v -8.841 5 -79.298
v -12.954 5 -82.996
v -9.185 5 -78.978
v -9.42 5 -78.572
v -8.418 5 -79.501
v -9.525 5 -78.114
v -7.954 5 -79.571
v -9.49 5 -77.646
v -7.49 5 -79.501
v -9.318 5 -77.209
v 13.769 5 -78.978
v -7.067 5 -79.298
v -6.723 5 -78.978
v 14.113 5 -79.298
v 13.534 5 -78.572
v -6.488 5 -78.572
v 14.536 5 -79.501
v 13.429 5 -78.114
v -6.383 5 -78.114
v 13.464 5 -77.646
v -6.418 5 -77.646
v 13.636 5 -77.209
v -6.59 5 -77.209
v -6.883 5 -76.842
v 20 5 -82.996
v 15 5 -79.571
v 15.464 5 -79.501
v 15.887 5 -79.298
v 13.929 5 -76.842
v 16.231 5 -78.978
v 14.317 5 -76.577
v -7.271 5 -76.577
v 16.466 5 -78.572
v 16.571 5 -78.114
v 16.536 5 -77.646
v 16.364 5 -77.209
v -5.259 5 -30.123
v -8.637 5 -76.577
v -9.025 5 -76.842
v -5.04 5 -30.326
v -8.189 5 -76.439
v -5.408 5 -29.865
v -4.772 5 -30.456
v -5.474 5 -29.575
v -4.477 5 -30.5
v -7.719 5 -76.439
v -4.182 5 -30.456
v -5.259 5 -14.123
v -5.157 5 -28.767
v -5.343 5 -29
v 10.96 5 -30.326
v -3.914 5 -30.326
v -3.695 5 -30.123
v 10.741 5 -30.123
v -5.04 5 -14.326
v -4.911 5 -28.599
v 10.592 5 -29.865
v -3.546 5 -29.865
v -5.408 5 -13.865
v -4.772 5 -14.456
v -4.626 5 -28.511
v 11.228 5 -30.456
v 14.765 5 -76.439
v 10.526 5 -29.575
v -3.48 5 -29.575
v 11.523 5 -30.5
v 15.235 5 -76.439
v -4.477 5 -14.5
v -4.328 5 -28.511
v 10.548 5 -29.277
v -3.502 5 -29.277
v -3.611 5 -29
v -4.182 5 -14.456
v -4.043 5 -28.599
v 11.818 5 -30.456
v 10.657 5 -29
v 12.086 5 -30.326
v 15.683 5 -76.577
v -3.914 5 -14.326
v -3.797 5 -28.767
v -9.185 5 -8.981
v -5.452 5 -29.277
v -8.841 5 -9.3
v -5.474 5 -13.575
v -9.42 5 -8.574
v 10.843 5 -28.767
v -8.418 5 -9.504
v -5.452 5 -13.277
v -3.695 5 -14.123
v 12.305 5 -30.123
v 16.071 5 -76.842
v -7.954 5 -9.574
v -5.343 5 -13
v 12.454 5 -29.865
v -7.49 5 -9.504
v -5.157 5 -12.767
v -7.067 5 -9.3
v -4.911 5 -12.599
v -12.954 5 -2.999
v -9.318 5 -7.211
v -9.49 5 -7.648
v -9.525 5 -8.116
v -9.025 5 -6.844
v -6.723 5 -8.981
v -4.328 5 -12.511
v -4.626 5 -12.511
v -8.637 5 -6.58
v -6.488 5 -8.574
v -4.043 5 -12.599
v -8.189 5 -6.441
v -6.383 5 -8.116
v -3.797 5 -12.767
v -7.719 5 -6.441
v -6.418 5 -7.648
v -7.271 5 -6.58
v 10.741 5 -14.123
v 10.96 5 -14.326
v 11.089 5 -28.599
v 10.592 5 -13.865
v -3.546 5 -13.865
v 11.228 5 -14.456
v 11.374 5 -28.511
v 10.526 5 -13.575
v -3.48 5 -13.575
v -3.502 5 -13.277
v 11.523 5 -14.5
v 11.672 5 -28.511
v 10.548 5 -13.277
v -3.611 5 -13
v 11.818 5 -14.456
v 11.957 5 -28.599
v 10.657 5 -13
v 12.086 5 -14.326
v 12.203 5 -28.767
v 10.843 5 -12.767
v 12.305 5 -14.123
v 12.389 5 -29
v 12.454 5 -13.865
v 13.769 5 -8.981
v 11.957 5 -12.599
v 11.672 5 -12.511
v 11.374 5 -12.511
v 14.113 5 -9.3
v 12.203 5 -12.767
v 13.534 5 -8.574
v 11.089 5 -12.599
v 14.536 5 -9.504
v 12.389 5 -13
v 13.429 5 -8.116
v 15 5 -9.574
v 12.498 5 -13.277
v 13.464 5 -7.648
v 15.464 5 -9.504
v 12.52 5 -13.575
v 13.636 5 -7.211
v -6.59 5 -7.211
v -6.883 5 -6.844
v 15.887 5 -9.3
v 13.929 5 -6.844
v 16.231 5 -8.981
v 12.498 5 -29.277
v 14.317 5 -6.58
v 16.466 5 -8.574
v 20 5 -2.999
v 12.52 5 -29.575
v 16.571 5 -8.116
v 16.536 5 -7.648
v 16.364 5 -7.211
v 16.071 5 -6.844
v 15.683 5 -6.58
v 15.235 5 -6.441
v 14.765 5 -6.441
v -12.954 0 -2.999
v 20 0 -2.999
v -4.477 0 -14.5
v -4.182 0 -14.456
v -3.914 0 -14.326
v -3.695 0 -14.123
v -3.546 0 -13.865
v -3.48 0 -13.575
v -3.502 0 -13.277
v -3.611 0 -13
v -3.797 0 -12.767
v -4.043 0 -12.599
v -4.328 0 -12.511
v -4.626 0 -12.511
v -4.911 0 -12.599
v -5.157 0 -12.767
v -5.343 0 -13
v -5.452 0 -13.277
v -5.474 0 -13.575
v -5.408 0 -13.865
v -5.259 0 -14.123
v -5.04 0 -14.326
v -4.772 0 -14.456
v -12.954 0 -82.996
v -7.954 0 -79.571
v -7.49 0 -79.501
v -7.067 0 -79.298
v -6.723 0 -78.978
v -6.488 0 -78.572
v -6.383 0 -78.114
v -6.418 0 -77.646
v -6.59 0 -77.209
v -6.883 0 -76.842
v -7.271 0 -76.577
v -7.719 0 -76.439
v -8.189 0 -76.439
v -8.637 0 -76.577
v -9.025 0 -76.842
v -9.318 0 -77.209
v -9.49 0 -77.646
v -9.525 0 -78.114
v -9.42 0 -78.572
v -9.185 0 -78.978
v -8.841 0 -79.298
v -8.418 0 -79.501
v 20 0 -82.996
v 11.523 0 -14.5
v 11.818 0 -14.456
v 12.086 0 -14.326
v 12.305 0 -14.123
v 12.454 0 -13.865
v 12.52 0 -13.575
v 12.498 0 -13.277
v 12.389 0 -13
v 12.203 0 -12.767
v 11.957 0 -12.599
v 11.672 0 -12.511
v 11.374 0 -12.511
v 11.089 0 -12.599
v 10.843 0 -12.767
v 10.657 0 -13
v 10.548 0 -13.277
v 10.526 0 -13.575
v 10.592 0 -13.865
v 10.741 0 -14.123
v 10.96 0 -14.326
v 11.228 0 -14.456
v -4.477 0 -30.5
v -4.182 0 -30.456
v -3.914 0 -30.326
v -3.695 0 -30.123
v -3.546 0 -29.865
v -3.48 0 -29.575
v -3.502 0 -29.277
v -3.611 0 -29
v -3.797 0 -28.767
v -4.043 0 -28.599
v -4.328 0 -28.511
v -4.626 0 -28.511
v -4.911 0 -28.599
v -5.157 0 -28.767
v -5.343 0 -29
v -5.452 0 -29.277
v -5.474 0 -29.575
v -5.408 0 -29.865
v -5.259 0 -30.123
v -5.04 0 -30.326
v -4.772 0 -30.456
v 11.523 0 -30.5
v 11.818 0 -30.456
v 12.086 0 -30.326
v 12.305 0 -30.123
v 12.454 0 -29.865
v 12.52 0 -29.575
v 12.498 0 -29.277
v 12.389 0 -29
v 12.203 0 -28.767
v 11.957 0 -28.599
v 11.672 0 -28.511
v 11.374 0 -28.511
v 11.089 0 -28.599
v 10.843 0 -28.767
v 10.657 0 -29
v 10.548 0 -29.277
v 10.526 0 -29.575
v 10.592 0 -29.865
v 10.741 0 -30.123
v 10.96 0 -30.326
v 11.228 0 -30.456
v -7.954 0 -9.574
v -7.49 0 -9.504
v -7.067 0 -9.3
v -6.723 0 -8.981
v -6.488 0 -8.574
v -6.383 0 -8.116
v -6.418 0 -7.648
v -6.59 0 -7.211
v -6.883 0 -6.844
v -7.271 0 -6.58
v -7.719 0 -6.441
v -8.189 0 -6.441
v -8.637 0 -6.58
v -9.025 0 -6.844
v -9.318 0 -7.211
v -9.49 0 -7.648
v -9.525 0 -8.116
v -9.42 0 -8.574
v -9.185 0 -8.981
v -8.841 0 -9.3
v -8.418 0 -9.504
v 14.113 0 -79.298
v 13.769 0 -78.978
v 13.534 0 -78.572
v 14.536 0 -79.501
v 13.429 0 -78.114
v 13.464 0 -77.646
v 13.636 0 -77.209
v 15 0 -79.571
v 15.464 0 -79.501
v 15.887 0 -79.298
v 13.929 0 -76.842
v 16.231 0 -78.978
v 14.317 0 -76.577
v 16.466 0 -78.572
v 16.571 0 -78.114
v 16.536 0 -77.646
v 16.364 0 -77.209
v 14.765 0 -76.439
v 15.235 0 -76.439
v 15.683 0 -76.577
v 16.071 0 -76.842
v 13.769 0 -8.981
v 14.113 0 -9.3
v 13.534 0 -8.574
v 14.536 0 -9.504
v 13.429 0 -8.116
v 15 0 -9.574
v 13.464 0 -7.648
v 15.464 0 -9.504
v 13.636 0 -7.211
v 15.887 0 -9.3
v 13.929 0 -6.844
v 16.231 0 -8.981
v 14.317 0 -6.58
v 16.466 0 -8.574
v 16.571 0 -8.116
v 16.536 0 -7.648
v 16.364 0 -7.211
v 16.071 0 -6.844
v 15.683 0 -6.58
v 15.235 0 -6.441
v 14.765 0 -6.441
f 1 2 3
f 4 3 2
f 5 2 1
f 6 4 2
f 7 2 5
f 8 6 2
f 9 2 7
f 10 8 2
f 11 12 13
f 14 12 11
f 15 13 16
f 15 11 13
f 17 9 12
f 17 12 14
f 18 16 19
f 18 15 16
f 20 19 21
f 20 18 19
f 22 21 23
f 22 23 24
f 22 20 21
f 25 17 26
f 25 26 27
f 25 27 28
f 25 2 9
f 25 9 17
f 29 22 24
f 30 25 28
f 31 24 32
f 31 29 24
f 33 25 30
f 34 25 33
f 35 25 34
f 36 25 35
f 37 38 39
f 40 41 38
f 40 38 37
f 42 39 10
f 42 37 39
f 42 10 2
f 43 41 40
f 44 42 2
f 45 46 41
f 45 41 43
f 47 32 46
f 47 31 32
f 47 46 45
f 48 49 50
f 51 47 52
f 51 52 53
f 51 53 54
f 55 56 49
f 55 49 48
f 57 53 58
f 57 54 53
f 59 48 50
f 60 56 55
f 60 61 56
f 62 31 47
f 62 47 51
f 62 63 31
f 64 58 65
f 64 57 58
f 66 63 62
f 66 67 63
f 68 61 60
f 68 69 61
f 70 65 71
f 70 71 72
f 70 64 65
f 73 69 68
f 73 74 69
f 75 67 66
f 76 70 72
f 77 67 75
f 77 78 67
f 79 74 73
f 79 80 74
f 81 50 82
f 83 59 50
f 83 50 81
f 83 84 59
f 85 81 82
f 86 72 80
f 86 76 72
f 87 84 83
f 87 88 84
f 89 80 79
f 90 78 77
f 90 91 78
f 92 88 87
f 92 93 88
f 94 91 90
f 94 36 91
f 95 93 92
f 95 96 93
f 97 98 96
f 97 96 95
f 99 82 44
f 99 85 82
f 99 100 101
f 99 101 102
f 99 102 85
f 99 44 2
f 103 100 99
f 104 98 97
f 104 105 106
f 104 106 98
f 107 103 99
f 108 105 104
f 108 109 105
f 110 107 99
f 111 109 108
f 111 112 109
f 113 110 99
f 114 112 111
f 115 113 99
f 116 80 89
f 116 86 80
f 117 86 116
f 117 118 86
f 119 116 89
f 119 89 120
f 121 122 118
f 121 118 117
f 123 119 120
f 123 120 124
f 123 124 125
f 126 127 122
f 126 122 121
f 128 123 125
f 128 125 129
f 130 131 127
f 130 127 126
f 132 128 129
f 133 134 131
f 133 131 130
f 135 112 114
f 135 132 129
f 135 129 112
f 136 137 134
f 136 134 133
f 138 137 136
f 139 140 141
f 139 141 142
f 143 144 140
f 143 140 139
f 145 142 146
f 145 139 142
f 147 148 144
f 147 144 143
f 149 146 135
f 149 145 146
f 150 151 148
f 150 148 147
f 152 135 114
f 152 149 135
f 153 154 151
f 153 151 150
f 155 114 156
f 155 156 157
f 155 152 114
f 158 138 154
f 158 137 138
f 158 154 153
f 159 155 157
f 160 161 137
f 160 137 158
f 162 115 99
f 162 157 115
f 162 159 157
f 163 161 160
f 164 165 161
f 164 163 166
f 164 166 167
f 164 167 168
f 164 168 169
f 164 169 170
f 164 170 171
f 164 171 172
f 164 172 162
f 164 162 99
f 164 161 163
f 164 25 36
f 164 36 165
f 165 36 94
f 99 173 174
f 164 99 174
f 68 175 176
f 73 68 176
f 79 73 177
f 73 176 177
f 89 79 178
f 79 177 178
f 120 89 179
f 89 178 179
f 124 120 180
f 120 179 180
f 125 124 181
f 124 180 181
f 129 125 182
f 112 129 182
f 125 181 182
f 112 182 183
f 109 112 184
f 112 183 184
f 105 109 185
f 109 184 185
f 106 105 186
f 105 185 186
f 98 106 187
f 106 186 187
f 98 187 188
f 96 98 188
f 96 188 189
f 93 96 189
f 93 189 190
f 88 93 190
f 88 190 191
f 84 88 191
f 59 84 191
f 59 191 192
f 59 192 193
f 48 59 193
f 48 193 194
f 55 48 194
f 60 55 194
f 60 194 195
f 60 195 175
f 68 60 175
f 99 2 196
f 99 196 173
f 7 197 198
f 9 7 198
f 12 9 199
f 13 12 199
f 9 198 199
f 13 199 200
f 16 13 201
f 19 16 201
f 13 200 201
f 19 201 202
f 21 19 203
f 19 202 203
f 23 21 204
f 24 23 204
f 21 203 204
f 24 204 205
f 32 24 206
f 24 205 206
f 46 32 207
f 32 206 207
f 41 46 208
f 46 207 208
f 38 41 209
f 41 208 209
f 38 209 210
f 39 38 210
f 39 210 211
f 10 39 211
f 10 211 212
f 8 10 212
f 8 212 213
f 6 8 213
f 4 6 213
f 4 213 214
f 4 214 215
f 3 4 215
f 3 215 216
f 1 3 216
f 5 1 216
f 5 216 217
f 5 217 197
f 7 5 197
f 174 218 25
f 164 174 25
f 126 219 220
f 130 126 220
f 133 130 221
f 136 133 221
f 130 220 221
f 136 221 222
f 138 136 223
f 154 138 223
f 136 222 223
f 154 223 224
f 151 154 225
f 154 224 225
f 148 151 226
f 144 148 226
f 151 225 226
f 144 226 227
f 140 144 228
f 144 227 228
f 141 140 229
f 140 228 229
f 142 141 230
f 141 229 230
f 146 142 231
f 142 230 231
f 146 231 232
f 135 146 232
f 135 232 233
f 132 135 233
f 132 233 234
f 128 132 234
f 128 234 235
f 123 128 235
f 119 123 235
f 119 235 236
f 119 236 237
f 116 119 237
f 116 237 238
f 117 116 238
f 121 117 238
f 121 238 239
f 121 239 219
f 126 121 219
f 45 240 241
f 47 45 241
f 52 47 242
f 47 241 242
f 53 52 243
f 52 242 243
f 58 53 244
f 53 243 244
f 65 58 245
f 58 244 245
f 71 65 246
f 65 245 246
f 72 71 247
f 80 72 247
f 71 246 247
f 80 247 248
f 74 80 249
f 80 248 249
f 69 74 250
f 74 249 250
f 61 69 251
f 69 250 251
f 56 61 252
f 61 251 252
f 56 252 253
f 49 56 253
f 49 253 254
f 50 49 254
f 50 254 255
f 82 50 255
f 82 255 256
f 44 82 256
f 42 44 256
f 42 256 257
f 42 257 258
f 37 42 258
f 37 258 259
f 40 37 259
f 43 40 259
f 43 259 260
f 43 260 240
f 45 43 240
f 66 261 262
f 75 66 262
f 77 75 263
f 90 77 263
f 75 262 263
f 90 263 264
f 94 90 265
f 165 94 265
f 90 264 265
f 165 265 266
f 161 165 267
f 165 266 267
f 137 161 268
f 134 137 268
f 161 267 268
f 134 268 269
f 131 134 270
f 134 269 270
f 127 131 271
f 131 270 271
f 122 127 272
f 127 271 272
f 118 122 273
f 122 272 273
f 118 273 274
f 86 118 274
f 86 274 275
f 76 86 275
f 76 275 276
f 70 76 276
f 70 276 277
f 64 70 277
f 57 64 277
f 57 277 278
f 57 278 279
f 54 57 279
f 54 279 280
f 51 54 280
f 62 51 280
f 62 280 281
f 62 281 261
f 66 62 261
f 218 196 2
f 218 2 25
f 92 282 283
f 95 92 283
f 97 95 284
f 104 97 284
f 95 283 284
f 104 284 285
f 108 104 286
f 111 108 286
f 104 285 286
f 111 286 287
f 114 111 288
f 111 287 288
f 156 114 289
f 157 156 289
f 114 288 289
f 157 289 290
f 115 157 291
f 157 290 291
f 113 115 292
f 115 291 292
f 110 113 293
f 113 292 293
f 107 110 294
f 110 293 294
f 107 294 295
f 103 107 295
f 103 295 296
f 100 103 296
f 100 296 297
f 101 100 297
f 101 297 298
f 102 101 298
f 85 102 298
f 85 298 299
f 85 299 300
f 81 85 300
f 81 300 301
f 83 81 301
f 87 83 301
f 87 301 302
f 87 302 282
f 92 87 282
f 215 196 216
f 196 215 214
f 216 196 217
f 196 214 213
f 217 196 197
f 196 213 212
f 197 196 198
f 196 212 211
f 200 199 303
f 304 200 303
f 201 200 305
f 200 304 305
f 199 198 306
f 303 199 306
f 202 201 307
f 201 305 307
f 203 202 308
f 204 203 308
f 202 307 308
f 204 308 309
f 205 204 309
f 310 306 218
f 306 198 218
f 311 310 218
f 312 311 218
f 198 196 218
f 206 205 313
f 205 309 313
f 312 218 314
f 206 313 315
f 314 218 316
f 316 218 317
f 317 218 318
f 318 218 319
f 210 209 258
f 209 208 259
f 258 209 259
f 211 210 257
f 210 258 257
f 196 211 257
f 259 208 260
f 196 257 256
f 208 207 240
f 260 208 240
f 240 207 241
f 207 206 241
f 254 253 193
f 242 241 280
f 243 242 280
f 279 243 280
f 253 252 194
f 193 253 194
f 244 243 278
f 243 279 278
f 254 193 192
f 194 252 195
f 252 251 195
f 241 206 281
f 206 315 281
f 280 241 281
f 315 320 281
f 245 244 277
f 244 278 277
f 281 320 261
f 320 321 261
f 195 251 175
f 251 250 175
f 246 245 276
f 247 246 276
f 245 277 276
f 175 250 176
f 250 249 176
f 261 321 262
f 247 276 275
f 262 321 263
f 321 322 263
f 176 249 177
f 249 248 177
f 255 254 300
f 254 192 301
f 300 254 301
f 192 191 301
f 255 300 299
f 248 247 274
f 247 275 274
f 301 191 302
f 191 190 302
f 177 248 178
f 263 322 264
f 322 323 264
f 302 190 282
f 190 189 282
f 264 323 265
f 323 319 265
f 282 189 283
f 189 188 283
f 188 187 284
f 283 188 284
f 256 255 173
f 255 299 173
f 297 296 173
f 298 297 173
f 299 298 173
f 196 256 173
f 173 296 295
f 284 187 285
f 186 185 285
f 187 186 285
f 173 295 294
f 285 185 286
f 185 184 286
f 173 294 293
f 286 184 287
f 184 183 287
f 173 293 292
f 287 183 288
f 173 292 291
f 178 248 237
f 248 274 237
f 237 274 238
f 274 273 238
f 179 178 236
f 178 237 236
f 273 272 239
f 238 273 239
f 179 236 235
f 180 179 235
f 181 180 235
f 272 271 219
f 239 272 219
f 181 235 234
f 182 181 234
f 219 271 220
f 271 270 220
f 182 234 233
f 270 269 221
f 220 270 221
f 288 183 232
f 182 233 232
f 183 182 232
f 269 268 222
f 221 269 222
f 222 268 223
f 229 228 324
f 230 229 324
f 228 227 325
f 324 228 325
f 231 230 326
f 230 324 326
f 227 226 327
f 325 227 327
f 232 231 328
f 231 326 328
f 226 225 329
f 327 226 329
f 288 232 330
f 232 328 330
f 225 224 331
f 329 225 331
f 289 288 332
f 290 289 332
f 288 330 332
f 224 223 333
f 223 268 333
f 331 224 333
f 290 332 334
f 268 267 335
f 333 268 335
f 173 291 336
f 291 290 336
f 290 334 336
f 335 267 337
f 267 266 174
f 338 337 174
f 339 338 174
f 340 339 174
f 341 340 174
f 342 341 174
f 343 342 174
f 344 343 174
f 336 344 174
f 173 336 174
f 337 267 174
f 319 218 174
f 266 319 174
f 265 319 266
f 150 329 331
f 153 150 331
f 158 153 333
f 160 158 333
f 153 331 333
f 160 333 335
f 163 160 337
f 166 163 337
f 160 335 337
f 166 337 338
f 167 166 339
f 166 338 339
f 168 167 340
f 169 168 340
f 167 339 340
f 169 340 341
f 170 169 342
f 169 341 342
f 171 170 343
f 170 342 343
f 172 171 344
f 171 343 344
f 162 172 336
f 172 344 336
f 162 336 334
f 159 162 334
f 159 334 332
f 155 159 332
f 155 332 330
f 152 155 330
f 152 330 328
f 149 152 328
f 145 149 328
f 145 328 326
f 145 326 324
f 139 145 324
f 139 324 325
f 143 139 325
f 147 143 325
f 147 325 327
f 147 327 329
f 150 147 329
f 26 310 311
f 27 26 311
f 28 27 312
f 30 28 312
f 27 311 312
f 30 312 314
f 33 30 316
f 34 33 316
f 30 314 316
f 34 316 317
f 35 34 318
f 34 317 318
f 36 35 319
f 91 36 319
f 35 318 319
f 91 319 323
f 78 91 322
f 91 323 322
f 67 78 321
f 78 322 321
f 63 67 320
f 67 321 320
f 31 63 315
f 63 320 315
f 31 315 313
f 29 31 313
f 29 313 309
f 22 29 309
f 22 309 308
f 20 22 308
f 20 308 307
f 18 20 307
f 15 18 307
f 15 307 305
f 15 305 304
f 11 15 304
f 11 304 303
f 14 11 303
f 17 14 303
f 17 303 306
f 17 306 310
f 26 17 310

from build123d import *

# Parameters (mm, degrees)
SKETCH1_W           = 20
SKETCH1_H           = 40
BOSS_EXTRUDE1_DEPTH = 5
SKETCH3_W           = 20
SKETCH3_H           = 5
BOSS_EXTRUDE2_DEPTH = 33
SKETCH4_W           = 20
SKETCH4_H           = 3
CUT_EXTRUDE2_DEPTH  = 76.855125074
SKETCH5_W           = 20
SKETCH5_H           = 5
BOSS_EXTRUDE3_DEPTH = 10
SKETCH6_W           = 20
SKETCH6_H           = 5
BOSS_EXTRUDE4_DEPTH = 1.5
SKETCH7_W           = 20
SKETCH7_H           = 5
BOSS_EXTRUDE5_DEPTH = 1.5
SKETCH9_W           = 83
SKETCH9_H           = 5
BOSS_EXTRUDE7_DEPTH = 12.954
SKETCH10_R          = 1
CUT_EXTRUDE3_DEPTH  = 87.978445606
SKETCH11_W          = 32.954
SKETCH11_H          = 1.4986
SKETCH11_H_2        = 1.50368
CUT_EXTRUDE4_DEPTH  = 87.978445606
SKETCH12_R          = 1.575
CUT_EXTRUDE5_DEPTH  = 86.518355536


with BuildPart() as part:
    # Sketch1 → Boss-Extrude1 (new body)
    with BuildSketch(Plane(origin=(0, 0, 0), x_dir=(1, 0, 0), z_dir=(0, 1, 0))):
        with Locations((10, 20)):
            Rectangle(SKETCH1_W, SKETCH1_H)
    extrude(amount=BOSS_EXTRUDE1_DEPTH)

    # Sketch3 → Boss-Extrude2 (add)
    with BuildSketch(Plane(origin=(0, 0, -40), x_dir=(-1, 0, 0), z_dir=(0, 0, -1))):
        with Locations((-10, 2.5)):
            Rectangle(SKETCH3_W, SKETCH3_H)
    extrude(amount=BOSS_EXTRUDE2_DEPTH)

    # Sketch4 → Cut-Extrude2 (cut, through all)
    with BuildSketch(Plane(origin=(0, 5, 0), x_dir=(1, 0, 0), z_dir=(0, 1, 0))):
        with Locations((10, 1.5)):
            Rectangle(SKETCH4_W, SKETCH4_H)
    extrude(amount=-CUT_EXTRUDE2_DEPTH, mode=Mode.SUBTRACT)

    # Sketch5 → Boss-Extrude3 (add)
    with BuildSketch(Plane(origin=(0, 0, -73), x_dir=(-1, 0, 0), z_dir=(0, 0, -1))):
        with Locations((-10, 2.5)):
            Rectangle(SKETCH5_W, SKETCH5_H)
    extrude(amount=BOSS_EXTRUDE3_DEPTH)

    # Sketch6 → Boss-Extrude4 (add)
    with BuildSketch(Plane(origin=(0, 0, -83), x_dir=(-1, 0, 0), z_dir=(0, 0, -1))):
        with Locations((-10, 2.5)):
            Rectangle(SKETCH6_W, SKETCH6_H)
    extrude(amount=BOSS_EXTRUDE4_DEPTH)

    # Sketch7 → Boss-Extrude5 (add)
    with BuildSketch(Plane.XY.offset(-3)):
        with Locations((10, 2.5)):
            Rectangle(SKETCH7_W, SKETCH7_H)
    extrude(amount=BOSS_EXTRUDE5_DEPTH)

    # Sketch9 → Boss-Extrude7 (add)
    with BuildSketch(Plane.ZY):
        with Locations((-43, 2.5)):
            Rectangle(SKETCH9_W, SKETCH9_H)
    extrude(amount=BOSS_EXTRUDE7_DEPTH)

    # Sketch10 → Cut-Extrude3 (cut, through all)
    with BuildSketch(Plane.XZ):
        with Locations(Location((-4.477, -13.5, 0), (0, 0, 270))):
            Circle(SKETCH10_R)
        with Locations(Location((11.523, -13.5, 0), (0, 0, 270))):
            Circle(SKETCH10_R)
        with Locations(Location((11.523, -29.5, 0), (0, 0, 270))):
            Circle(SKETCH10_R)
        with Locations(Location((-4.477, -29.5, 0), (0, 0, 270))):
            Circle(SKETCH10_R)
    extrude(amount=-CUT_EXTRUDE3_DEPTH, mode=Mode.SUBTRACT)

    # Sketch11 → Cut-Extrude4 (cut, through all)
    with BuildSketch(Plane.XZ):
        with Locations((3.523, -2.2493)):
            Rectangle(SKETCH11_W, SKETCH11_H)
        with Locations((3.523, -83.74816)):
            Rectangle(SKETCH11_W, SKETCH11_H_2)
    extrude(amount=-CUT_EXTRUDE4_DEPTH, mode=Mode.SUBTRACT)

    # Sketch12 → Cut-Extrude5 (cut, through all)
    with BuildSketch(Plane.XZ):
        with Locations(Location((-7.954, -7.9986, 0), (0, 0, 270))):
            Circle(SKETCH12_R)
        with Locations(Location((15, -7.9986, 0), (0, 0, 270))):
            Circle(SKETCH12_R)
        with Locations(Location((15, -77.99632, 0), (0, 0, 270))):
            Circle(SKETCH12_R)
        with Locations(Location((-7.954, -77.99632, 0), (0, 0, 270))):
            Circle(SKETCH12_R)
    extrude(amount=-CUT_EXTRUDE5_DEPTH, mode=Mode.SUBTRACT)


solid = part.part
